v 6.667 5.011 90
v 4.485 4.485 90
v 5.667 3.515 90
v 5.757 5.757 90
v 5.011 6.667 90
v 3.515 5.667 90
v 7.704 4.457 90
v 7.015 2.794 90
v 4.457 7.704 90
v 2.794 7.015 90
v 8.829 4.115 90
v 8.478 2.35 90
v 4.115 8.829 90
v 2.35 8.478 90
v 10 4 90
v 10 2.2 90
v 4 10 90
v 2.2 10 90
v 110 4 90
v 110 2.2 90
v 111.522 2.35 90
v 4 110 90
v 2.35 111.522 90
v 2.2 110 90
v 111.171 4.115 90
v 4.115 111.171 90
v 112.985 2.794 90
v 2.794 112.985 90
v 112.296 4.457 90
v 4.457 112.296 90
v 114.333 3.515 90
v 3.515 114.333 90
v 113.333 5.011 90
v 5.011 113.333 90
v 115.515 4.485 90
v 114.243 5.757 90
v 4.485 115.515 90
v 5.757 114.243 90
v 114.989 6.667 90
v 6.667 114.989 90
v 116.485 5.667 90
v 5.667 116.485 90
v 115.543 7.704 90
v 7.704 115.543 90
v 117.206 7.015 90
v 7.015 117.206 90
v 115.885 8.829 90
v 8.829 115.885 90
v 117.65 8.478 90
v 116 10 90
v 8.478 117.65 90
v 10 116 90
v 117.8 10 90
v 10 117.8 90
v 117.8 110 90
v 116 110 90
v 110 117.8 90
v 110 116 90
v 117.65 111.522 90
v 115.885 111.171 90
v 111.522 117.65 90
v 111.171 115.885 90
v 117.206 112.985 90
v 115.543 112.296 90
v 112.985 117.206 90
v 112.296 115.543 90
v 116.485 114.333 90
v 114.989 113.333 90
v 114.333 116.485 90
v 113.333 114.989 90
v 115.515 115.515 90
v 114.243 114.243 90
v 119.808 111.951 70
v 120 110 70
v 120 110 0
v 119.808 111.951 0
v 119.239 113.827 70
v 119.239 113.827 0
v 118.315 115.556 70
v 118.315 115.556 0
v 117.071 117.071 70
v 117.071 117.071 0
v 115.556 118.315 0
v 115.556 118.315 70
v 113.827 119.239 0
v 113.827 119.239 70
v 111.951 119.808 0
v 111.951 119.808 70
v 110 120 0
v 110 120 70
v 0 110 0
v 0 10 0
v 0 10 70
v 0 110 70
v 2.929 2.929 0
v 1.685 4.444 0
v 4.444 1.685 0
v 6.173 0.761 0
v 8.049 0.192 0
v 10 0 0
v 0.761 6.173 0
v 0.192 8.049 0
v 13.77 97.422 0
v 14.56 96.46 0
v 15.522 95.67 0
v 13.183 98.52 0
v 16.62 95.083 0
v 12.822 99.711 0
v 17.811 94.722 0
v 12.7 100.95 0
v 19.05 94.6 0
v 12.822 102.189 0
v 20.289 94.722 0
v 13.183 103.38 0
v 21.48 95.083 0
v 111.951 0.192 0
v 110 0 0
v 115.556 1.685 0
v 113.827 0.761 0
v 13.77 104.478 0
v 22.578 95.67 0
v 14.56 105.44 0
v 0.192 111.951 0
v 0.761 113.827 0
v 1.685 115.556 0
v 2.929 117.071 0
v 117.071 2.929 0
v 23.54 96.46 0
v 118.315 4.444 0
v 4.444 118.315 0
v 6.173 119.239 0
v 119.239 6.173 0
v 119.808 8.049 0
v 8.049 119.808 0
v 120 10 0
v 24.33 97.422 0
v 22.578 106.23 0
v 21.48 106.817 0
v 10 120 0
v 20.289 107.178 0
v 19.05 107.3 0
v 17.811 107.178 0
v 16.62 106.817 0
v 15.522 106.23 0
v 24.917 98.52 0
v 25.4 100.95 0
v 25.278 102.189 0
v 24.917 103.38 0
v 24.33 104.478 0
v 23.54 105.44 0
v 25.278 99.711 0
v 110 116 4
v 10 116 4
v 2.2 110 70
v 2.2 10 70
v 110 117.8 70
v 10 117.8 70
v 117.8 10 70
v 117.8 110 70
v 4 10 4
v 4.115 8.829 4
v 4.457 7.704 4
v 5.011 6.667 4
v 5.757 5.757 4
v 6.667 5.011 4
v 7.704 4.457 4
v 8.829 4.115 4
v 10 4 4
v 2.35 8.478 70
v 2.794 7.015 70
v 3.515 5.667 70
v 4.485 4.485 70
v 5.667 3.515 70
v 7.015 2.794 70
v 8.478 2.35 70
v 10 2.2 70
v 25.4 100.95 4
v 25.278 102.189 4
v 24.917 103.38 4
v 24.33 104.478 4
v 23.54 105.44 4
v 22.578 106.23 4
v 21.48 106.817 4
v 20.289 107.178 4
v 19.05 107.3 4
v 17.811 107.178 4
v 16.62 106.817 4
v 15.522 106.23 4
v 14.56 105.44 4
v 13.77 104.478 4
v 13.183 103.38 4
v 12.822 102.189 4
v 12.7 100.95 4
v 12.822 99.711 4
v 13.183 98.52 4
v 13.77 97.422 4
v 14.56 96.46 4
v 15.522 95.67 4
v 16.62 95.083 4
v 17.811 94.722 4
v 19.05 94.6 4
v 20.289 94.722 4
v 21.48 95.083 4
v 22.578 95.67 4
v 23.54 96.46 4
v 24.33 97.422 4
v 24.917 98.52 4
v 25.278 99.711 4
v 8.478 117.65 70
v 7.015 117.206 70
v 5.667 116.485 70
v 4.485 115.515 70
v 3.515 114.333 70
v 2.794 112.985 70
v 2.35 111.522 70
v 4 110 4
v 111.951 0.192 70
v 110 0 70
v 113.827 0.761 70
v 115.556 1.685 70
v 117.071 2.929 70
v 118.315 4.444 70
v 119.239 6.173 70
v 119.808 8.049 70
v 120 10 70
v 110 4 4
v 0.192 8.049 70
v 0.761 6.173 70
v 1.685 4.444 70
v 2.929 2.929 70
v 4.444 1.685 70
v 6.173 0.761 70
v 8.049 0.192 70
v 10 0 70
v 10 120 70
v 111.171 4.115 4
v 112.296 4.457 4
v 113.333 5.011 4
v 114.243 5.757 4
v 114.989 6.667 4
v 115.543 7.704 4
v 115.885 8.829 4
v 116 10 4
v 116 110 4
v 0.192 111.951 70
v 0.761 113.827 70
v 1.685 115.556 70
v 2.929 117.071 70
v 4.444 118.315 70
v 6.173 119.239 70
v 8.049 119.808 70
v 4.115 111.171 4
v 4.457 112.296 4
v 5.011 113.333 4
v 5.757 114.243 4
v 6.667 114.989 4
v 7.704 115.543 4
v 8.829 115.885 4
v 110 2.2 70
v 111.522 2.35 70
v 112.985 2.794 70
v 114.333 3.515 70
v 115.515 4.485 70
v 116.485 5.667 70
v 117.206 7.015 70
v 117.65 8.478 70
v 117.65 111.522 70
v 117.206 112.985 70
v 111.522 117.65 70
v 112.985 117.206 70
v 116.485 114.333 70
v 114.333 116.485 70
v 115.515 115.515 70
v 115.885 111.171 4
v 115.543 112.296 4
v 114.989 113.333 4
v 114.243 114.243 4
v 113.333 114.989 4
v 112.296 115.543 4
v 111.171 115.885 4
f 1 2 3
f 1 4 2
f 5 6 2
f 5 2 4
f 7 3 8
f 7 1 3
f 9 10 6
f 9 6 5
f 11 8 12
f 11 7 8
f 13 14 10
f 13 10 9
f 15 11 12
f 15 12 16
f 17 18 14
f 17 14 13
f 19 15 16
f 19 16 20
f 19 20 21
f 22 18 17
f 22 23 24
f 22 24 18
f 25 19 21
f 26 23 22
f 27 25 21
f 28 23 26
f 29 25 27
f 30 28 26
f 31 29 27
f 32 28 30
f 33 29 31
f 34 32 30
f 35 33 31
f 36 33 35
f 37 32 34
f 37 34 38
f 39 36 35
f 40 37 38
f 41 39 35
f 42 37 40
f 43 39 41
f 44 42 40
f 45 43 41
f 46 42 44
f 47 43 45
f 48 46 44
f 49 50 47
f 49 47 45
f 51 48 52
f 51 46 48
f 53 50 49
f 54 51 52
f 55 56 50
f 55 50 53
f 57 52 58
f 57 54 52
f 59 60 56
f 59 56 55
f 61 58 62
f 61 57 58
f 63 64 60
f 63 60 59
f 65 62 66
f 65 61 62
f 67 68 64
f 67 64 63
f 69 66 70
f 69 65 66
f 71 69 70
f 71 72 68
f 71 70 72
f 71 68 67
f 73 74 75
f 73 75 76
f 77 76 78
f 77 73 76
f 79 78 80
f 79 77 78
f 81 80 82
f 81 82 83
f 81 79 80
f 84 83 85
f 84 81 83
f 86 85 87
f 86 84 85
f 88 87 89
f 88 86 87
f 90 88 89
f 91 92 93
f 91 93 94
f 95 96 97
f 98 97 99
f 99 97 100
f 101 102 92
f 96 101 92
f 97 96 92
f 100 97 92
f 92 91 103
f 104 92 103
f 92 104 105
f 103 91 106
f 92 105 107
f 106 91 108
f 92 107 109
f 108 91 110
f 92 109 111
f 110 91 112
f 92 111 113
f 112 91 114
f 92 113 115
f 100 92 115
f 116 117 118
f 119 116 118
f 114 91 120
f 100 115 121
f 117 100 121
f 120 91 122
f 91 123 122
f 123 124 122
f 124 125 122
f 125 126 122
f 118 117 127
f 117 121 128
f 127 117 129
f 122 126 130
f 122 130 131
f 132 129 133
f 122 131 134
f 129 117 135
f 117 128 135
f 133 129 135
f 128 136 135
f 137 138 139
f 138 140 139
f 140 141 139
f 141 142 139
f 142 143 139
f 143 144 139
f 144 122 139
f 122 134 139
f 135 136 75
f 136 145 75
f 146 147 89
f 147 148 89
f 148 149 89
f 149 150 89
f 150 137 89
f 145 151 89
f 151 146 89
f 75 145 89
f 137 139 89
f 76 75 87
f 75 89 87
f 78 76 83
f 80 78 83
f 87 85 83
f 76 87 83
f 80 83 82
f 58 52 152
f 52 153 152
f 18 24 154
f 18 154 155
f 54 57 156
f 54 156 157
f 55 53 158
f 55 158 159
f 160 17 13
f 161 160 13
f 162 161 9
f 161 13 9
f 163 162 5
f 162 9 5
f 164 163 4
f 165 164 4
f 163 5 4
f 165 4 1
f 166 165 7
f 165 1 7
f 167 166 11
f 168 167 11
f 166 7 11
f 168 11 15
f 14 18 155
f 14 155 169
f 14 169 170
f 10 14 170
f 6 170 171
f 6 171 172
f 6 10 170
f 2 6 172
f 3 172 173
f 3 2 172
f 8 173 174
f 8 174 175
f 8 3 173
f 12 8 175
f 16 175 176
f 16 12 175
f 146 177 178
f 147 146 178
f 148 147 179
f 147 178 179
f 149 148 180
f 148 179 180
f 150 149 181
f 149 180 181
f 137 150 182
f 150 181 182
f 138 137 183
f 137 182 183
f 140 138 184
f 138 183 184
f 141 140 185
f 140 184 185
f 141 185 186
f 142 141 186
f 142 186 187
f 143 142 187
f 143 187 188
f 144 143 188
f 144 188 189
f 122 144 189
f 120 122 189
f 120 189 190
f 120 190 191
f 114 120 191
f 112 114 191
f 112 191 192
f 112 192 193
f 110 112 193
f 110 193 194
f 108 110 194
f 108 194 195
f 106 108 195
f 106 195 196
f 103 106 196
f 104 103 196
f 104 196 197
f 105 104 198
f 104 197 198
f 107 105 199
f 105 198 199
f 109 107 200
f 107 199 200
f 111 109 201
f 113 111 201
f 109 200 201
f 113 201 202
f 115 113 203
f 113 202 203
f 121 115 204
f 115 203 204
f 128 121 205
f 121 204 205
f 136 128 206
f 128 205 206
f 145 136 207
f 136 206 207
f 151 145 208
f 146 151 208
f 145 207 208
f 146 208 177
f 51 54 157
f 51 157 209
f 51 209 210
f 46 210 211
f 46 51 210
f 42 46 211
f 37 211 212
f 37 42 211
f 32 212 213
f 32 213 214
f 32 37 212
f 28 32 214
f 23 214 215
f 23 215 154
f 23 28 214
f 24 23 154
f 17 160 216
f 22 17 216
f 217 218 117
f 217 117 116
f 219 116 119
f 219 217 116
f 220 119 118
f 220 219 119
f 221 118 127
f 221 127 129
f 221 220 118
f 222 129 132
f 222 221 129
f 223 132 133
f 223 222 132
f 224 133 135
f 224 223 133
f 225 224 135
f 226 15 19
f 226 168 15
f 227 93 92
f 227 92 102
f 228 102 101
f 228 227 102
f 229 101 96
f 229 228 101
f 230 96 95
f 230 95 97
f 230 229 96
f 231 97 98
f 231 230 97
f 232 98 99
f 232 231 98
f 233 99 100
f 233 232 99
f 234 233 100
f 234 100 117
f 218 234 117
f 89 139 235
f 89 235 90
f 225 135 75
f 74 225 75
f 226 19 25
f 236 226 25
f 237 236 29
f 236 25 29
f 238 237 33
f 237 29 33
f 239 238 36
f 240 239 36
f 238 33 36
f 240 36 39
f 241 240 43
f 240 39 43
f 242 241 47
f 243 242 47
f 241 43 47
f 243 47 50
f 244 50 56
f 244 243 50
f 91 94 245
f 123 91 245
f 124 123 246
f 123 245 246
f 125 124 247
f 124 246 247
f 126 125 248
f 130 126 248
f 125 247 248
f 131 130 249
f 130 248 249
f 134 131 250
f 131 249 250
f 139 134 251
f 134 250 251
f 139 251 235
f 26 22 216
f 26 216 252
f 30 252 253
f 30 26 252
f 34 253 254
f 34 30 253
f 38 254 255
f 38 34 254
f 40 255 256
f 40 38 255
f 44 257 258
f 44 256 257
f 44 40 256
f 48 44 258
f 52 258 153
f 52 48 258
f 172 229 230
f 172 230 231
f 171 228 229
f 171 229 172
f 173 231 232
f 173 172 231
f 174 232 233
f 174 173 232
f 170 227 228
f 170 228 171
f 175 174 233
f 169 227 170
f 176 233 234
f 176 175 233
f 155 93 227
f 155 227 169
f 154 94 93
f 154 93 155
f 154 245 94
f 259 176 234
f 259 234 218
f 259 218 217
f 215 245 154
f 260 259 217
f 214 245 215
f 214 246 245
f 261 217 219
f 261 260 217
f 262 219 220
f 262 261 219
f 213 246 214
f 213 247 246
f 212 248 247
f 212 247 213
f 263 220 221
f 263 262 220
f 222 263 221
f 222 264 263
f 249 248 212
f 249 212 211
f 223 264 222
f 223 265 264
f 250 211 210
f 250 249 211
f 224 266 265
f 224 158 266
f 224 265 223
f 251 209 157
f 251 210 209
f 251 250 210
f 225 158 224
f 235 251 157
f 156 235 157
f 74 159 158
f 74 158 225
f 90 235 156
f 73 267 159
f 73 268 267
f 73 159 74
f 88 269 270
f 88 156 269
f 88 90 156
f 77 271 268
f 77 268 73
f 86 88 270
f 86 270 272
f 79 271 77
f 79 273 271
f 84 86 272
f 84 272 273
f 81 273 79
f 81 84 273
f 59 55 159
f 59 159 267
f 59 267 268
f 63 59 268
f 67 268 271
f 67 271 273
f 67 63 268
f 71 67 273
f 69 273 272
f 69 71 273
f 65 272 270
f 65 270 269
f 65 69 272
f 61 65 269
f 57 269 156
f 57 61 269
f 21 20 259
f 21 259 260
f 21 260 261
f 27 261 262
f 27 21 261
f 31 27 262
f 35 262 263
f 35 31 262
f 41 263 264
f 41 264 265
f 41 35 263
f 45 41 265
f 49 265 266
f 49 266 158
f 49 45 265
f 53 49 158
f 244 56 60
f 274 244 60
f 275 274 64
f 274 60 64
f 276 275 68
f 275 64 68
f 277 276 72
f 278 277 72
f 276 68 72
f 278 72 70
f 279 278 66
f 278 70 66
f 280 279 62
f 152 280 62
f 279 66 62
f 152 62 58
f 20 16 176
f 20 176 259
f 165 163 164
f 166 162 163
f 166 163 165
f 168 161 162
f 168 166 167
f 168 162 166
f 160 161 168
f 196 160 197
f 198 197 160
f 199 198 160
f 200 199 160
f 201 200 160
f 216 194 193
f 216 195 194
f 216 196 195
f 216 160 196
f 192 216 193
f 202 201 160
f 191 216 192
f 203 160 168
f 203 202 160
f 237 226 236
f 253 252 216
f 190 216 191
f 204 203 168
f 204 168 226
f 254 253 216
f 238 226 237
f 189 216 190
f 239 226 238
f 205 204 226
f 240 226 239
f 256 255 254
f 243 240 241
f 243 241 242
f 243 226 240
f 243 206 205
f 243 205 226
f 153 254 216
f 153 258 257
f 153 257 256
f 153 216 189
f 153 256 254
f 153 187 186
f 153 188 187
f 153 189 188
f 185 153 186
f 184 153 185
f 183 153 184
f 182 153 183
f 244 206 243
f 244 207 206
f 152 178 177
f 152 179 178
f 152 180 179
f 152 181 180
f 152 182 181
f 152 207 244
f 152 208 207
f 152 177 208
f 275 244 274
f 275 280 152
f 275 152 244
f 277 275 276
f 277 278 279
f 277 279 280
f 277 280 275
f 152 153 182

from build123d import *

# Parameters (mm, degrees)
SKETCH2_W           = 120
SKETCH2_H           = 120
BOSS_EXTRUDE1_DEPTH = 90
FILLET1_R           = 10
SHELL1_T            = -4
CUT_EXTRUDE1_DEPTH  = 20
SKETCH4_R           = 6.35
CUT_EXTRUDE2_DEPTH  = 199.773717644


with BuildPart() as part:
    # Sketch2 → Boss-Extrude1 (new body)
    with BuildSketch(Plane.XY):
        with Locations((60, 60)):
            Rectangle(SKETCH2_W, SKETCH2_H)
    extrude(amount=BOSS_EXTRUDE1_DEPTH)

    # Fillet1
    fillet1_edges = [part.edges().sort_by_distance(p)[0] for p in [
        (0, 120, 45),
        (120, 120, 45),
        (120, 0, 45),
        (0, 0, 45),
    ]]
    fillet(fillet1_edges, radius=FILLET1_R)

    # Shell1
    shell1_openings = [part.faces().sort_by_distance(p)[0] for p in [
        (60, 60, 90),
    ]]
    offset(amount=SHELL1_T, openings=shell1_openings, kind=Kind.INTERSECTION)

    # Sketch3 → Cut-Extrude1 (cut)
    with BuildSketch(Plane.XY.offset(90)):
        with BuildLine():
            Line((0, 110), (0, 10))
            ThreePointArc((0, 10), (2.928932188, 2.928932188), (10, 0))
            Line((10, 0), (110, 0))
            ThreePointArc((110, 0), (117.071067812, 2.928932188), (120, 10))
            Line((120, 10), (120, 110))
            ThreePointArc((120, 110), (117.071067812, 117.071067812), (110, 120))
            Line((110, 120), (10, 120))
            ThreePointArc((10, 120), (2.928932188, 117.071067812), (0, 110))
        make_face()
        with BuildLine():
            Line((2.2, 110), (2.2, 10))
            ThreePointArc((2.2, 10), (4.484567107, 4.484567107), (10, 2.2))
            Line((10, 2.2), (110, 2.2))
            ThreePointArc((110, 2.2), (115.515432893, 4.484567107), (117.8, 10))
            Line((117.8, 10), (117.8, 110))
            ThreePointArc((117.8, 110), (115.515432893, 115.515432893), (110, 117.8))
            Line((110, 117.8), (10, 117.8))
            ThreePointArc((10, 117.8), (4.484567107, 115.515432893), (2.2, 110))
        make_face(mode=Mode.SUBTRACT)
    extrude(amount=-CUT_EXTRUDE1_DEPTH, mode=Mode.SUBTRACT)

    # Sketch4 → Cut-Extrude2 (cut, through all)
    with BuildSketch(Plane(origin=(92.802964226, -8.446878735, 120), x_dir=(1, 0, 0), z_dir=(0, 0, 1))):
        with Locations((-73.752964226, 109.396878735)):
            Circle(SKETCH4_R)
    extrude(amount=-CUT_EXTRUDE2_DEPTH, mode=Mode.SUBTRACT)


solid = part.part
